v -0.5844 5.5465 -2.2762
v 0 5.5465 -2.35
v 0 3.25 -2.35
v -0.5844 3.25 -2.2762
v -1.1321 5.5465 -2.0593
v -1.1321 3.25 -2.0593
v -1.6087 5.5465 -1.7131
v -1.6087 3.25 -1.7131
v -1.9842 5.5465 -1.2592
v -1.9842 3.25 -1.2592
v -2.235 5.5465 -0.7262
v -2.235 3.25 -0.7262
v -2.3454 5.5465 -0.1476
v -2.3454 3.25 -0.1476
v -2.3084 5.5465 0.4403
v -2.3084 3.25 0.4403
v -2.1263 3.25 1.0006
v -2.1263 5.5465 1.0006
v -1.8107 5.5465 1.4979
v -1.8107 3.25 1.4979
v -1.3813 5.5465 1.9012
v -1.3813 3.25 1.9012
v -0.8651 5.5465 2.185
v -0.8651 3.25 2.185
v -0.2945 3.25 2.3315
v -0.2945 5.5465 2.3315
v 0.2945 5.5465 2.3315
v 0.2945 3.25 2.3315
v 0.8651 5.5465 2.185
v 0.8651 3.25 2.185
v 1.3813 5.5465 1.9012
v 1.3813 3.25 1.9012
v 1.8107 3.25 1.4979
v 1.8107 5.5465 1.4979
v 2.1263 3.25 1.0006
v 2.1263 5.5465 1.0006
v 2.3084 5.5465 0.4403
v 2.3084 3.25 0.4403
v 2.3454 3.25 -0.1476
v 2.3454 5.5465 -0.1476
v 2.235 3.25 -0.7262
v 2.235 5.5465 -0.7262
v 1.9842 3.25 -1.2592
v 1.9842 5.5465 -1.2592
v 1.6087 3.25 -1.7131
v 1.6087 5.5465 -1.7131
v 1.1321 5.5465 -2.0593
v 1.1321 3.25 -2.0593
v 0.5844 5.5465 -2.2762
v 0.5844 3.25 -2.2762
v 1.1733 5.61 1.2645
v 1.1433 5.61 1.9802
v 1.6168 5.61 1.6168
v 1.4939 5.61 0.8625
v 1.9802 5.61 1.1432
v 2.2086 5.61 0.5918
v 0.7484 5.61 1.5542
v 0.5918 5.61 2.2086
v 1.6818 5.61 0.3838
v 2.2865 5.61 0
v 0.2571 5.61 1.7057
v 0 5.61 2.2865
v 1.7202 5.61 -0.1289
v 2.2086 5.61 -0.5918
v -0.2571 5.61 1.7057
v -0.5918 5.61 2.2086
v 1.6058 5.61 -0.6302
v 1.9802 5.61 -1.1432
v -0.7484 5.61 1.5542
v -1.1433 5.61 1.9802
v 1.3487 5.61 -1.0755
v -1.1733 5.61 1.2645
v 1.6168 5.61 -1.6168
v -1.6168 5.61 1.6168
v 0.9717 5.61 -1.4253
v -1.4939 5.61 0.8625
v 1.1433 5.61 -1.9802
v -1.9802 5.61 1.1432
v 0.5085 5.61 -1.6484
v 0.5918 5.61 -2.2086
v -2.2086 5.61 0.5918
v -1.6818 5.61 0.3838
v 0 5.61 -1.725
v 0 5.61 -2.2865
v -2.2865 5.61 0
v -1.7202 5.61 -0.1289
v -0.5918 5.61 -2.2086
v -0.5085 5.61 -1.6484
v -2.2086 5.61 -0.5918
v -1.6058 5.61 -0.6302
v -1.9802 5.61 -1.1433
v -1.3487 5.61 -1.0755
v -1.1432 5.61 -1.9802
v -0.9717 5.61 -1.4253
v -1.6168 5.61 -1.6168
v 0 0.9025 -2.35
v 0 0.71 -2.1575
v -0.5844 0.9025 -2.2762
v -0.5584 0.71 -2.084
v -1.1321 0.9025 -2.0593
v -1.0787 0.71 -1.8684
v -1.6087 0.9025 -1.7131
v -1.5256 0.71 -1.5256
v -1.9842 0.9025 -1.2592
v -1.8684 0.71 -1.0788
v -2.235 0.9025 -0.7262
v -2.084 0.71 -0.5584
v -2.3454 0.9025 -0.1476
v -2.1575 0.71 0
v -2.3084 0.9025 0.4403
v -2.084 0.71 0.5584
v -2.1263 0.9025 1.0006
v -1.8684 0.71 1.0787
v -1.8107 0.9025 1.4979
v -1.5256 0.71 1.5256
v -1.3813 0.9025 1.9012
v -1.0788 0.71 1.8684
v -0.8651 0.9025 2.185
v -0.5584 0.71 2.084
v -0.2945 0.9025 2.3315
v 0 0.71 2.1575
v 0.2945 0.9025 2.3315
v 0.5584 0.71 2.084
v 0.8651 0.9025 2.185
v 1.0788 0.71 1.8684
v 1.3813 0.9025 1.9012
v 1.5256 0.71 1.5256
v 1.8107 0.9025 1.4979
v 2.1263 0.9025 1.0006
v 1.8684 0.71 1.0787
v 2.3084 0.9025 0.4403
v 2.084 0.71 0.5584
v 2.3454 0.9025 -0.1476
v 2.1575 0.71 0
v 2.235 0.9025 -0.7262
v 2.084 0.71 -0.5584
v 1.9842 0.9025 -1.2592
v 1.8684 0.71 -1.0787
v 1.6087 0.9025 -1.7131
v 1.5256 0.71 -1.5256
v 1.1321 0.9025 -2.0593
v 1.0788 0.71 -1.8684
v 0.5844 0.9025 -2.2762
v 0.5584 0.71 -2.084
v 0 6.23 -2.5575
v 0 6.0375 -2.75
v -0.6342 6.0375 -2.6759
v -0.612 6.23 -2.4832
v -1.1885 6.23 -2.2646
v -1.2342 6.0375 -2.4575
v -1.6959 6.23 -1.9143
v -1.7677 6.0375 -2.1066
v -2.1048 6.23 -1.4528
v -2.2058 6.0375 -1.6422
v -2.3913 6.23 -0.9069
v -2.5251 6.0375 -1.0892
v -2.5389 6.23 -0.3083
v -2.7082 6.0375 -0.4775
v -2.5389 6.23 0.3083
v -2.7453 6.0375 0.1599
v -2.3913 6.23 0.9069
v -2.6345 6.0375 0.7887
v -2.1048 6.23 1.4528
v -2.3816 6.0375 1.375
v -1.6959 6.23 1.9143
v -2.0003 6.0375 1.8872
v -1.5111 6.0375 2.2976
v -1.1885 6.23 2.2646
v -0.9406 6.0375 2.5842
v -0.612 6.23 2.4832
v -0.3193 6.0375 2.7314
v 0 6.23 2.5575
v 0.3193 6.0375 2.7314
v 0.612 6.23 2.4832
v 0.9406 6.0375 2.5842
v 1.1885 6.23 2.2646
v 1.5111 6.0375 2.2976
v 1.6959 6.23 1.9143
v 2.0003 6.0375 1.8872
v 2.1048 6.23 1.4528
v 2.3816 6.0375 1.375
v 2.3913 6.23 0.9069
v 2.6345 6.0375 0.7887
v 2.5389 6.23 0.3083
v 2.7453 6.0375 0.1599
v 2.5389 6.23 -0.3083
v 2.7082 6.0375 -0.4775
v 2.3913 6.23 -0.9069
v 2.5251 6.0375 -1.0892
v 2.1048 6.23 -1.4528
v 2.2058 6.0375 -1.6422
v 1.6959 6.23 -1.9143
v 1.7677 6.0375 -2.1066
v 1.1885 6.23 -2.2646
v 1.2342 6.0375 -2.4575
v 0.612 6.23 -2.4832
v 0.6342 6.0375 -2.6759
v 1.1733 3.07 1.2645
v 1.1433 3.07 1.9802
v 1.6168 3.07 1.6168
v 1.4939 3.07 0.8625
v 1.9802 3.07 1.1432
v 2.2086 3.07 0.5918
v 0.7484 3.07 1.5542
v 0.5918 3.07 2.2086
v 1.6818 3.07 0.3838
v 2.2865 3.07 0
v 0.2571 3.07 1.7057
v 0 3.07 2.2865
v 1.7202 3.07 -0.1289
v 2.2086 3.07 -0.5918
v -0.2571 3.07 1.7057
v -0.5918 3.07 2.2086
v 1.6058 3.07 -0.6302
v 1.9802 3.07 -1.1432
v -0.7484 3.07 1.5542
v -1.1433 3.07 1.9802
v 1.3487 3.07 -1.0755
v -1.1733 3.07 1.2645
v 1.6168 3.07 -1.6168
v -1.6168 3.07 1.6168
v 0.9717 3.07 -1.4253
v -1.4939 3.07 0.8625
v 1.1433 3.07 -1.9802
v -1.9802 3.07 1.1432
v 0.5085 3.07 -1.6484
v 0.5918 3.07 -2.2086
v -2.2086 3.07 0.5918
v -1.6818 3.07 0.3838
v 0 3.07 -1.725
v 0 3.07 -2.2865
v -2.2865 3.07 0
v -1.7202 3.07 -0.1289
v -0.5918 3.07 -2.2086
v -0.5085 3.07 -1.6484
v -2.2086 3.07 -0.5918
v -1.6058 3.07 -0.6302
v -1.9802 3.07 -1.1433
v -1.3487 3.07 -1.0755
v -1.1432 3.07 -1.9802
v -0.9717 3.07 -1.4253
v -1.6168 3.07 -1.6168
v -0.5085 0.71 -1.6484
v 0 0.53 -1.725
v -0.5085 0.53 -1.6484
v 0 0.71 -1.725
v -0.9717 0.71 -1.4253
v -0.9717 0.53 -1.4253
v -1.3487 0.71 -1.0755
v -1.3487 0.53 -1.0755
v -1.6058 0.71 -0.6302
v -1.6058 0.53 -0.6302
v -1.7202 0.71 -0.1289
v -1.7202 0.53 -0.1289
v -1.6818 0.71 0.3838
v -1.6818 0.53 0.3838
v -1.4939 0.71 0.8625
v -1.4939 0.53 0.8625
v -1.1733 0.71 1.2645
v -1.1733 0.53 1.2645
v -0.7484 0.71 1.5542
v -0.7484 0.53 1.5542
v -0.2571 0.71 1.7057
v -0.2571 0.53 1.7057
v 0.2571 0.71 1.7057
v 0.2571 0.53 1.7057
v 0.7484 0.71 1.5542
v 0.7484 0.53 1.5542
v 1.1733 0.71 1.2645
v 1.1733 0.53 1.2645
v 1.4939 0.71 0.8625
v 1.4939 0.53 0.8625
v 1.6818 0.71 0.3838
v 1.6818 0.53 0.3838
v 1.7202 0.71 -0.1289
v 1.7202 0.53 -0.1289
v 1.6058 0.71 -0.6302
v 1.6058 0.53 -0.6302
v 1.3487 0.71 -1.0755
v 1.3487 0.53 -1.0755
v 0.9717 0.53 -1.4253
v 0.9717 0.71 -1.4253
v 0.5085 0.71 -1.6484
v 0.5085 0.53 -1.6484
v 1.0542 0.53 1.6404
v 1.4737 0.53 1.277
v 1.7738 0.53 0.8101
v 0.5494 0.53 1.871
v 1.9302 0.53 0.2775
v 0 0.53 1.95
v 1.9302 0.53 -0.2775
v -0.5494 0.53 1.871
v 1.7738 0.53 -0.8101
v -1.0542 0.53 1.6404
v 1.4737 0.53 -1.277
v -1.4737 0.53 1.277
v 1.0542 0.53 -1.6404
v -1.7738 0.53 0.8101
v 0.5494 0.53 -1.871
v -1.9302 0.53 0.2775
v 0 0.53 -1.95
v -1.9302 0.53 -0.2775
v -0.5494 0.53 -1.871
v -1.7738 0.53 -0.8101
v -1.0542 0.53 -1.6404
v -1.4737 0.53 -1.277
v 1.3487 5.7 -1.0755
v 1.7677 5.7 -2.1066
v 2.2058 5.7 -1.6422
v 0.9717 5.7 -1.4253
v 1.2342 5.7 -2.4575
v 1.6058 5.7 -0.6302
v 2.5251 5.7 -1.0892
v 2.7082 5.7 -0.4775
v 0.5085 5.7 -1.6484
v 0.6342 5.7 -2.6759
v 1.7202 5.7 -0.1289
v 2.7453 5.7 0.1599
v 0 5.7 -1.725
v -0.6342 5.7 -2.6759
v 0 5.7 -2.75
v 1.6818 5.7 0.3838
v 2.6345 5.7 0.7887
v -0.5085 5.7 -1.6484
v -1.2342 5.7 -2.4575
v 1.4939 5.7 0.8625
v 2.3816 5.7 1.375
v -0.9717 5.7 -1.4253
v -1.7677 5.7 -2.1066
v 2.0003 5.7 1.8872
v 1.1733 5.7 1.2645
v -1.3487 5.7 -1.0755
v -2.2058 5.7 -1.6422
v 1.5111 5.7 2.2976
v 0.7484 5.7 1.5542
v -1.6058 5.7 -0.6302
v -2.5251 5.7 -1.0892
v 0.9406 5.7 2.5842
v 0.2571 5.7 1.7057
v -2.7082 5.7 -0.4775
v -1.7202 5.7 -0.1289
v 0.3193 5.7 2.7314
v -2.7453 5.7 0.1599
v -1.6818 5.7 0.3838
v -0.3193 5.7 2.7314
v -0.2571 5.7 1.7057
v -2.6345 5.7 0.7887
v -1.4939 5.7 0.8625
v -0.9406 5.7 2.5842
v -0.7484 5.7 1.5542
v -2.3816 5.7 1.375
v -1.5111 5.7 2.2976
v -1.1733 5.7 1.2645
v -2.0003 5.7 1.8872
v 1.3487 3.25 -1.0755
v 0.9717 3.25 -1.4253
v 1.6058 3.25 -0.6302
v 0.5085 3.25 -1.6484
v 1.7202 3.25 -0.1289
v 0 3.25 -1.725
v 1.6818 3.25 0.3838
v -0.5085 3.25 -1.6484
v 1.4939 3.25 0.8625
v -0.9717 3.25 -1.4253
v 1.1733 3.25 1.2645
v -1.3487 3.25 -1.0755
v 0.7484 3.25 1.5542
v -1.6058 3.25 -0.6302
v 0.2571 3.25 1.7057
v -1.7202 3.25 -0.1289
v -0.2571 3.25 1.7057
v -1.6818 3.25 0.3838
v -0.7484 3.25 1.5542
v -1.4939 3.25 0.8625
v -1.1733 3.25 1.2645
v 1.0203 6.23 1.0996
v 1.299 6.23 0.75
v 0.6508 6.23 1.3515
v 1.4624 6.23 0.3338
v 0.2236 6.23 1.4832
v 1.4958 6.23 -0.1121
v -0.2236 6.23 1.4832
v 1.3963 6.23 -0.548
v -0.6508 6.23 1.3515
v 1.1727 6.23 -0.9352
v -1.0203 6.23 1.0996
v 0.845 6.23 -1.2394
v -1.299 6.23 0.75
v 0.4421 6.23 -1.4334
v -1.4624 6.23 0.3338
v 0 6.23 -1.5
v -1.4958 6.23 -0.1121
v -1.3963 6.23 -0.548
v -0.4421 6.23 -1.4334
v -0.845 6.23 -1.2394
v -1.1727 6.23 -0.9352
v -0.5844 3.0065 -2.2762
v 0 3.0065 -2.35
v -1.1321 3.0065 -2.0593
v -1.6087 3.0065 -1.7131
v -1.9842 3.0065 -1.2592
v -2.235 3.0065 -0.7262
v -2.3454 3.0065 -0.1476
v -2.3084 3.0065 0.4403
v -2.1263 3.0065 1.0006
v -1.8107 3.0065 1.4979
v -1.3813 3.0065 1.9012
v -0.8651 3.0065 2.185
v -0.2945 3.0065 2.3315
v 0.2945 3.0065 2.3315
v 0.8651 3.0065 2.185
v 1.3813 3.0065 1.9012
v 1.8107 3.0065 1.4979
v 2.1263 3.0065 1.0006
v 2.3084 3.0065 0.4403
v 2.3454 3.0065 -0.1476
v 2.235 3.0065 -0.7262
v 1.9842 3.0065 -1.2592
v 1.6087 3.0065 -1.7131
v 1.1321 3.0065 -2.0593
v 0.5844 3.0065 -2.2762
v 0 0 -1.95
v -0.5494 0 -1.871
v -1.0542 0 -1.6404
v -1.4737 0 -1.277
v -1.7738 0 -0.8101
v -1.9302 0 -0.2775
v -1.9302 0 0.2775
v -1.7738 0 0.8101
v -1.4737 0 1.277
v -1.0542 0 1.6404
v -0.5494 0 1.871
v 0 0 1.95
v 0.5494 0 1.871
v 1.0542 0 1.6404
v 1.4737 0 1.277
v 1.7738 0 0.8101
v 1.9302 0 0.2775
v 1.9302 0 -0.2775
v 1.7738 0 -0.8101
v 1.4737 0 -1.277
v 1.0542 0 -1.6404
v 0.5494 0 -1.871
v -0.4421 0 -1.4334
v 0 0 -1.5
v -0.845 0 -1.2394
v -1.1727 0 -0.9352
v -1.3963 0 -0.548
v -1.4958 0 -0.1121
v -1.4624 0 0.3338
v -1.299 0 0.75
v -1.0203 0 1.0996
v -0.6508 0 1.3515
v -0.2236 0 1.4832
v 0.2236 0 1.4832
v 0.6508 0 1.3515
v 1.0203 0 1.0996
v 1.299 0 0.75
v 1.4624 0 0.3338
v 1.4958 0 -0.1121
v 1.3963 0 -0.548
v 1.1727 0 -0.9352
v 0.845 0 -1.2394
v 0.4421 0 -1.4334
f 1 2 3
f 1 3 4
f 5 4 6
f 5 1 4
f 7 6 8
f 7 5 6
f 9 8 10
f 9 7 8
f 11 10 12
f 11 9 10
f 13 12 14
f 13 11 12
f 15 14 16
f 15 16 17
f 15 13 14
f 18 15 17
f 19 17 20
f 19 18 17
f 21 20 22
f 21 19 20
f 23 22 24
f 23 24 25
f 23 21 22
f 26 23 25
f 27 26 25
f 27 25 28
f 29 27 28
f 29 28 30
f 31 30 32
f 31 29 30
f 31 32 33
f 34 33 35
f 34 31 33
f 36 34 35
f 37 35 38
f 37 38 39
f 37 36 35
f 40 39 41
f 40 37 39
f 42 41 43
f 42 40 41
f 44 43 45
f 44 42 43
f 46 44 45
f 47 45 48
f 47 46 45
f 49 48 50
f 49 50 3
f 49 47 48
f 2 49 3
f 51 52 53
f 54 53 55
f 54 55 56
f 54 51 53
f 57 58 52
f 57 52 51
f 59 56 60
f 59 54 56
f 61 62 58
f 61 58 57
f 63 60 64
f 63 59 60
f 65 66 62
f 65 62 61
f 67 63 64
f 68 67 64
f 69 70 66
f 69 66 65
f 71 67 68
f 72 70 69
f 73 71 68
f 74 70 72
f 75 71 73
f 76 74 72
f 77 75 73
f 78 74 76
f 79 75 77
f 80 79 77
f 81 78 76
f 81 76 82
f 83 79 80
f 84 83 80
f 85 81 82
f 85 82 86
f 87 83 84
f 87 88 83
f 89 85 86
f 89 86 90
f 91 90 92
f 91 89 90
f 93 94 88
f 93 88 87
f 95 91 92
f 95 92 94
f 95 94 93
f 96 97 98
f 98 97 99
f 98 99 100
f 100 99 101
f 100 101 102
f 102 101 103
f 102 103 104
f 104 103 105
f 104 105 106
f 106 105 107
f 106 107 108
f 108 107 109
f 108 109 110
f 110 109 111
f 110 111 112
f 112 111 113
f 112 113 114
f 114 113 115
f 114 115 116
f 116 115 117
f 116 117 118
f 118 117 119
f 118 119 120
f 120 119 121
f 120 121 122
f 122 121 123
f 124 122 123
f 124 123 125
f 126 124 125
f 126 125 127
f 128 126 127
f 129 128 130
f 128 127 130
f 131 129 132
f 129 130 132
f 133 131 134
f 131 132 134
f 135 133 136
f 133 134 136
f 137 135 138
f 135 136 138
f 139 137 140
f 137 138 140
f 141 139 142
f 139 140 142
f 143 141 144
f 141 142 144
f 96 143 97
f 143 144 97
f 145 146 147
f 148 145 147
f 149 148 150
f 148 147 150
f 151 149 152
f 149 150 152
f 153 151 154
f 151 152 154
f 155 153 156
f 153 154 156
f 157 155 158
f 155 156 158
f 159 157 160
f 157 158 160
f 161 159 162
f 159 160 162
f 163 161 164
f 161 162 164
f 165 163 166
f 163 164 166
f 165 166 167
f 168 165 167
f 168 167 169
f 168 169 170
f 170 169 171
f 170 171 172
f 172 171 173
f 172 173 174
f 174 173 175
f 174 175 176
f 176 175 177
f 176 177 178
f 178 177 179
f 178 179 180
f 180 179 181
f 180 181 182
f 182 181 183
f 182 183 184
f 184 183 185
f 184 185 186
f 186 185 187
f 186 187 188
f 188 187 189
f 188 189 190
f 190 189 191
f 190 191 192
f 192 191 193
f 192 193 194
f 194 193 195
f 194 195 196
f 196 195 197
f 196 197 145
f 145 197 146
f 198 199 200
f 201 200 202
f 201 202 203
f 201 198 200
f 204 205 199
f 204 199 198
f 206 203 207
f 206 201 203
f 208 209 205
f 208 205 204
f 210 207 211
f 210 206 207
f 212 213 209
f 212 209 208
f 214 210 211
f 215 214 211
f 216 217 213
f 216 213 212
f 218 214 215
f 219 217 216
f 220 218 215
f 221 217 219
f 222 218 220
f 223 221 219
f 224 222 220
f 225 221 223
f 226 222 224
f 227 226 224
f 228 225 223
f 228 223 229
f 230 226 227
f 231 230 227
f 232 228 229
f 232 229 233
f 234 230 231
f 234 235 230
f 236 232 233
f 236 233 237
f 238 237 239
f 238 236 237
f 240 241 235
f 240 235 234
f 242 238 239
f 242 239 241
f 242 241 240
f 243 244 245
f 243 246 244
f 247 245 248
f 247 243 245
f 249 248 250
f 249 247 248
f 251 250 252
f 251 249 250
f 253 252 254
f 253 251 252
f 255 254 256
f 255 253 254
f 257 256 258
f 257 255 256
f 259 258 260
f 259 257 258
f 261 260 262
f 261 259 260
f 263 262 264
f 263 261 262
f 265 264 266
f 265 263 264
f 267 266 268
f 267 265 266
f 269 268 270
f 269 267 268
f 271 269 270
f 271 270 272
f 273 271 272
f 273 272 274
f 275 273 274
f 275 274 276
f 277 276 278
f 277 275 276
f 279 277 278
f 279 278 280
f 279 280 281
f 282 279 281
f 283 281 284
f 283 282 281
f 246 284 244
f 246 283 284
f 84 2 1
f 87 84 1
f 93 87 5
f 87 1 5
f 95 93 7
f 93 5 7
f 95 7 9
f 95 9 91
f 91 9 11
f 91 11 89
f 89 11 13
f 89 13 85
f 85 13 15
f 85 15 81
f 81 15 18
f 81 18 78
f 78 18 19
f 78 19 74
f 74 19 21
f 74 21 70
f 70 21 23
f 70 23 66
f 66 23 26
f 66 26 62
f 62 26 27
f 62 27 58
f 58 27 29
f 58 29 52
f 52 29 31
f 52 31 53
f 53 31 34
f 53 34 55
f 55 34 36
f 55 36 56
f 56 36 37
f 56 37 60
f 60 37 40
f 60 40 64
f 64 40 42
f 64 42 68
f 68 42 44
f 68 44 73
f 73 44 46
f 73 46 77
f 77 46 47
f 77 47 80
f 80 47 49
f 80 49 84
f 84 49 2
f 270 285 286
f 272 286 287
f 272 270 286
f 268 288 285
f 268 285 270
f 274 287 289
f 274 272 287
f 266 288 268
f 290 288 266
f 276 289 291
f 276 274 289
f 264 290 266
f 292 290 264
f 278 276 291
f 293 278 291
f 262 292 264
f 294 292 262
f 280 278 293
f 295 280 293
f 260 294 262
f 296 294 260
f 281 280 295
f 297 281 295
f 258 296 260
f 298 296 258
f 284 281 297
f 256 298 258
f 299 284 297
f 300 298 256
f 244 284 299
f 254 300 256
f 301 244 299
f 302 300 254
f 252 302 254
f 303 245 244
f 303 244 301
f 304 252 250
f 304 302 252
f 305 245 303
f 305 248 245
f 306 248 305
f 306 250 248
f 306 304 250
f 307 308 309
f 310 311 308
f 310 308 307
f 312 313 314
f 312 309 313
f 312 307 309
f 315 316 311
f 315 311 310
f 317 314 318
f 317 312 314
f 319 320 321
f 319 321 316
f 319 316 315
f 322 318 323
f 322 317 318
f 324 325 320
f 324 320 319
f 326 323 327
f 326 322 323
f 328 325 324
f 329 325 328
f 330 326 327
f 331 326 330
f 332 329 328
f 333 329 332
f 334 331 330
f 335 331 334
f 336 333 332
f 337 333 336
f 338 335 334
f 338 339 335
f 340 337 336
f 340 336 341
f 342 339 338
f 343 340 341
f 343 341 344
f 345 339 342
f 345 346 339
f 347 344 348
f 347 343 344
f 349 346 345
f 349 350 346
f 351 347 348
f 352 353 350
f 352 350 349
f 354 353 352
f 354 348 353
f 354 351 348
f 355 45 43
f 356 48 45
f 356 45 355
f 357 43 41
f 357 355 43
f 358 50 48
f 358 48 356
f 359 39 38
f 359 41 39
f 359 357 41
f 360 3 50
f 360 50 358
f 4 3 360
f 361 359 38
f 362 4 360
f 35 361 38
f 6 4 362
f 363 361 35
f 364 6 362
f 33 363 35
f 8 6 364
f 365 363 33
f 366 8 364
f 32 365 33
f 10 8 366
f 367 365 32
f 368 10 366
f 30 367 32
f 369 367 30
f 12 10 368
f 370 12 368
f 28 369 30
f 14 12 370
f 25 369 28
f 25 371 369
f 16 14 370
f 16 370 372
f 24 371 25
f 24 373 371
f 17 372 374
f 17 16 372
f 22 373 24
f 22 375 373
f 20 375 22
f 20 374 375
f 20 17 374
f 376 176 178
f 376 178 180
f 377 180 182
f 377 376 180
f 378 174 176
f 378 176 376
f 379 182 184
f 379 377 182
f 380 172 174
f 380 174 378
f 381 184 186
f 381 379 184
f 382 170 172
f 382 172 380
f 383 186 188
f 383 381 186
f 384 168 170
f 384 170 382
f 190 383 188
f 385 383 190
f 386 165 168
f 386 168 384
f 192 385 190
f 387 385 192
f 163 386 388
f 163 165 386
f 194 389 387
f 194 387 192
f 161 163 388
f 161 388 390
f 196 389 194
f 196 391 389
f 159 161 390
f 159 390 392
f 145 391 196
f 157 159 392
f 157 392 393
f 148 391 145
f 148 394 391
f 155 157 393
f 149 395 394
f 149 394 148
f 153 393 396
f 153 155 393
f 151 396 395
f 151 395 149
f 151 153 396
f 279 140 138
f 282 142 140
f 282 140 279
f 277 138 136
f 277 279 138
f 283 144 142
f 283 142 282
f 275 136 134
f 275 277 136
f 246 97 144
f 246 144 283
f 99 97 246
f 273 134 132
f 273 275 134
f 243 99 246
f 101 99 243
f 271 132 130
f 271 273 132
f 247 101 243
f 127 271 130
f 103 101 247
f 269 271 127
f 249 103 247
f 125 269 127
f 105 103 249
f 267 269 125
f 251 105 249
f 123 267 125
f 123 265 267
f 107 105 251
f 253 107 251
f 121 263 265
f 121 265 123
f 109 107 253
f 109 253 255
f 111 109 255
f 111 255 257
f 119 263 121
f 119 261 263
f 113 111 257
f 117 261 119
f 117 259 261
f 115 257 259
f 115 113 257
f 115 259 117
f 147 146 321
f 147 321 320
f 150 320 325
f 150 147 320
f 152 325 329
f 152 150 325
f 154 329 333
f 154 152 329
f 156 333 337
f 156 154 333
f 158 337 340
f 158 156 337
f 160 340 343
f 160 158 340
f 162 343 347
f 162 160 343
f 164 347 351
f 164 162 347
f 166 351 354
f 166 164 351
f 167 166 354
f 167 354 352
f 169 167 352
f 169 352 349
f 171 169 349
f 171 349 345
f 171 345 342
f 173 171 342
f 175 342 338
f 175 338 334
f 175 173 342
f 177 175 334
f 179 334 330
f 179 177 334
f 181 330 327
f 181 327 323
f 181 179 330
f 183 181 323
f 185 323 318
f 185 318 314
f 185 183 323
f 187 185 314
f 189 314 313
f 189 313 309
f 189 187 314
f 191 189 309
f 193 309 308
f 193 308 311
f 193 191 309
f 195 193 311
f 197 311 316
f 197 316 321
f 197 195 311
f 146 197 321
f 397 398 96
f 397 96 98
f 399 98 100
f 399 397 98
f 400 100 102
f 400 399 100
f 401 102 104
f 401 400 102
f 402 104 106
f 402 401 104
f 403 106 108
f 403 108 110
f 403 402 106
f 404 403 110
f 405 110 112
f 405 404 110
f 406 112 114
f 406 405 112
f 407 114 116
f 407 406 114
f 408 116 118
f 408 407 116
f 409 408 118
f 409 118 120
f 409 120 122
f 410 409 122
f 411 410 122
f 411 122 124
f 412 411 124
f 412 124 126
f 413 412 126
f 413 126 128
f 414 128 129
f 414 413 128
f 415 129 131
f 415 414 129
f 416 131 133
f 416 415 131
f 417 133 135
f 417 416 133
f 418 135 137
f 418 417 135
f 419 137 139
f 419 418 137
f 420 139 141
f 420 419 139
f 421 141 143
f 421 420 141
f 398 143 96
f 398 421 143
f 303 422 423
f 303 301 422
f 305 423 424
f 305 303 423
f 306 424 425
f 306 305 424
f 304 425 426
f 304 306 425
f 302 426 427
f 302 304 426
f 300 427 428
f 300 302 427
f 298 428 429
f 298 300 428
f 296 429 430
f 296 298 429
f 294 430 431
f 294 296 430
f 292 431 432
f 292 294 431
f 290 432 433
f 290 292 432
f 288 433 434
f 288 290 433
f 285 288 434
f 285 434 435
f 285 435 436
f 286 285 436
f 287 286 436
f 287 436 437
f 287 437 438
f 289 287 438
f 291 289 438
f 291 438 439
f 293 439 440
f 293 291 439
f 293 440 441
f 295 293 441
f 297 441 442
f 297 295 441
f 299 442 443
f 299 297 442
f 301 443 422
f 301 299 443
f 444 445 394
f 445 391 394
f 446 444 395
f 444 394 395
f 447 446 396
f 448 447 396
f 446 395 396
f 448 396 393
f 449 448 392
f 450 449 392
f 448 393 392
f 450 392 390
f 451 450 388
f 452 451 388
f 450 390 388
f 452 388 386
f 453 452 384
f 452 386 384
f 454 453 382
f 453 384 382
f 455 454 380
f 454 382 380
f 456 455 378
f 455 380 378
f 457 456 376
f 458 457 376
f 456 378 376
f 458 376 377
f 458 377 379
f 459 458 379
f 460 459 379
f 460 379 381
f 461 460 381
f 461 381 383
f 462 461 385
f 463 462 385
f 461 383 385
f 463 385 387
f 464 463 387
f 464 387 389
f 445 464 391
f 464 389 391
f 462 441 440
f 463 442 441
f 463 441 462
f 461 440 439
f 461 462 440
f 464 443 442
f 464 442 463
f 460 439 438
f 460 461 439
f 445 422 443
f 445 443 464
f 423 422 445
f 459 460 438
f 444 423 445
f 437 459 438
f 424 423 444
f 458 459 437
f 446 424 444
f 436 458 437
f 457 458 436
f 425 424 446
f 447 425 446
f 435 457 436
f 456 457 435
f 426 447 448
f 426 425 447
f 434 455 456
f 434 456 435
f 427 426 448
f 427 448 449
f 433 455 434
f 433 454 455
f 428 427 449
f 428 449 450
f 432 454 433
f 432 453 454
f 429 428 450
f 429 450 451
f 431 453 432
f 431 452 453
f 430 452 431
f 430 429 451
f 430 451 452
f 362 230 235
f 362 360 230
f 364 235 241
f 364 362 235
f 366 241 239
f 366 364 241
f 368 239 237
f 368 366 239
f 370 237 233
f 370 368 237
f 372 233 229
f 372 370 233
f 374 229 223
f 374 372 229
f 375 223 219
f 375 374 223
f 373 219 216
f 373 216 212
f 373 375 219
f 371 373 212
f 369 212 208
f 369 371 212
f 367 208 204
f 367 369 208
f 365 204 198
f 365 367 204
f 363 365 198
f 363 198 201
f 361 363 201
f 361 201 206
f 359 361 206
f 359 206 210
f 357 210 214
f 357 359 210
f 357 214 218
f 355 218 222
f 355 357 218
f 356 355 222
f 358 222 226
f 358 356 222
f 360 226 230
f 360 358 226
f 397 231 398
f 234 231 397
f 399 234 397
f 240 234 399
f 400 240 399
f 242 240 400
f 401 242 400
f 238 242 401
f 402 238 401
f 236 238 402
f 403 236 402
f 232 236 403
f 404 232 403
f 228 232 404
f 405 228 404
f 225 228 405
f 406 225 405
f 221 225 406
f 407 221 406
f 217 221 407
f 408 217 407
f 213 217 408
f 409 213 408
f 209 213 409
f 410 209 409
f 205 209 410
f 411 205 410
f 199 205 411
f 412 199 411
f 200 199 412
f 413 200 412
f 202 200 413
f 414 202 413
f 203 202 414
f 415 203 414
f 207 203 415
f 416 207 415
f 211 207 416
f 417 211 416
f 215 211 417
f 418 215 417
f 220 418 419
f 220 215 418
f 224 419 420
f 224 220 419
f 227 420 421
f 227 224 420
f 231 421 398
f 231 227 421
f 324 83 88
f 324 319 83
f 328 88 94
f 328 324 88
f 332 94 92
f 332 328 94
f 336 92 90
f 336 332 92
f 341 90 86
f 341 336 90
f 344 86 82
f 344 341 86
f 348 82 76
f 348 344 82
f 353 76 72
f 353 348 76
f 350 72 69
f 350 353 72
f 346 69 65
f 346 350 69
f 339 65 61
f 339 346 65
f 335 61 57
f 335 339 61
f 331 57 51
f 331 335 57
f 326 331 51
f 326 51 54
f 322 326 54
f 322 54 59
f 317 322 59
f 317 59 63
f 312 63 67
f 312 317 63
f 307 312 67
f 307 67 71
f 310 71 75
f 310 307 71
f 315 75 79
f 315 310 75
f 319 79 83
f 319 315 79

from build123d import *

# Parameters (mm, degrees)
SKETCH5_W     = 1.5
SKETCH5_H     = 6.23
CHAMFER1_SIZE = 0.0635
CHAMFER2_SIZE = 0.1925


with BuildPart() as part:
    # Sketch3 → Revolve1 (revolve)
    with BuildSketch(Plane.XY):
        Polygon((0, 0), (1.95, 0), (1.95, 0.53), (1.725, 0.53), (1.725, 0.71), (2.35, 0.71), (2.35, 3.07), (1.725, 3.07), (1.725, 3.25), (2.35, 3.25), (2.35, 5.61), (1.725, 5.61), (1.725, 5.7), (2.75, 5.7), (2.75, 6.23), (0, 6.23), align=None)
    revolve(axis=Axis((0, 0, 0), (0, 1, 0)))

    # Sketch5 → Cut-Revolve1 (revolve, cut)
    with BuildSketch(Plane.XY):
        with Locations((0.75, 3.115)):
            Rectangle(SKETCH5_W, SKETCH5_H)
    revolve(axis=Axis((0, 0, 0), (0, 1, 0)), mode=Mode.SUBTRACT)

    # Chamfer1
    chamfer1_edges = [part.edges().sort_by_distance(p)[0] for p in [
        (-2.35, 3.07, 0),
        (-2.35, 5.61, 0),
    ]]
    chamfer(chamfer1_edges, length=CHAMFER1_SIZE)

    # Chamfer2
    chamfer2_edges = [part.edges().sort_by_distance(p)[0] for p in [
        (-2.75, 6.23, 0),
        (-2.35, 0.71, 0),
    ]]
    chamfer(chamfer2_edges, length=CHAMFER2_SIZE)


solid = part.part
